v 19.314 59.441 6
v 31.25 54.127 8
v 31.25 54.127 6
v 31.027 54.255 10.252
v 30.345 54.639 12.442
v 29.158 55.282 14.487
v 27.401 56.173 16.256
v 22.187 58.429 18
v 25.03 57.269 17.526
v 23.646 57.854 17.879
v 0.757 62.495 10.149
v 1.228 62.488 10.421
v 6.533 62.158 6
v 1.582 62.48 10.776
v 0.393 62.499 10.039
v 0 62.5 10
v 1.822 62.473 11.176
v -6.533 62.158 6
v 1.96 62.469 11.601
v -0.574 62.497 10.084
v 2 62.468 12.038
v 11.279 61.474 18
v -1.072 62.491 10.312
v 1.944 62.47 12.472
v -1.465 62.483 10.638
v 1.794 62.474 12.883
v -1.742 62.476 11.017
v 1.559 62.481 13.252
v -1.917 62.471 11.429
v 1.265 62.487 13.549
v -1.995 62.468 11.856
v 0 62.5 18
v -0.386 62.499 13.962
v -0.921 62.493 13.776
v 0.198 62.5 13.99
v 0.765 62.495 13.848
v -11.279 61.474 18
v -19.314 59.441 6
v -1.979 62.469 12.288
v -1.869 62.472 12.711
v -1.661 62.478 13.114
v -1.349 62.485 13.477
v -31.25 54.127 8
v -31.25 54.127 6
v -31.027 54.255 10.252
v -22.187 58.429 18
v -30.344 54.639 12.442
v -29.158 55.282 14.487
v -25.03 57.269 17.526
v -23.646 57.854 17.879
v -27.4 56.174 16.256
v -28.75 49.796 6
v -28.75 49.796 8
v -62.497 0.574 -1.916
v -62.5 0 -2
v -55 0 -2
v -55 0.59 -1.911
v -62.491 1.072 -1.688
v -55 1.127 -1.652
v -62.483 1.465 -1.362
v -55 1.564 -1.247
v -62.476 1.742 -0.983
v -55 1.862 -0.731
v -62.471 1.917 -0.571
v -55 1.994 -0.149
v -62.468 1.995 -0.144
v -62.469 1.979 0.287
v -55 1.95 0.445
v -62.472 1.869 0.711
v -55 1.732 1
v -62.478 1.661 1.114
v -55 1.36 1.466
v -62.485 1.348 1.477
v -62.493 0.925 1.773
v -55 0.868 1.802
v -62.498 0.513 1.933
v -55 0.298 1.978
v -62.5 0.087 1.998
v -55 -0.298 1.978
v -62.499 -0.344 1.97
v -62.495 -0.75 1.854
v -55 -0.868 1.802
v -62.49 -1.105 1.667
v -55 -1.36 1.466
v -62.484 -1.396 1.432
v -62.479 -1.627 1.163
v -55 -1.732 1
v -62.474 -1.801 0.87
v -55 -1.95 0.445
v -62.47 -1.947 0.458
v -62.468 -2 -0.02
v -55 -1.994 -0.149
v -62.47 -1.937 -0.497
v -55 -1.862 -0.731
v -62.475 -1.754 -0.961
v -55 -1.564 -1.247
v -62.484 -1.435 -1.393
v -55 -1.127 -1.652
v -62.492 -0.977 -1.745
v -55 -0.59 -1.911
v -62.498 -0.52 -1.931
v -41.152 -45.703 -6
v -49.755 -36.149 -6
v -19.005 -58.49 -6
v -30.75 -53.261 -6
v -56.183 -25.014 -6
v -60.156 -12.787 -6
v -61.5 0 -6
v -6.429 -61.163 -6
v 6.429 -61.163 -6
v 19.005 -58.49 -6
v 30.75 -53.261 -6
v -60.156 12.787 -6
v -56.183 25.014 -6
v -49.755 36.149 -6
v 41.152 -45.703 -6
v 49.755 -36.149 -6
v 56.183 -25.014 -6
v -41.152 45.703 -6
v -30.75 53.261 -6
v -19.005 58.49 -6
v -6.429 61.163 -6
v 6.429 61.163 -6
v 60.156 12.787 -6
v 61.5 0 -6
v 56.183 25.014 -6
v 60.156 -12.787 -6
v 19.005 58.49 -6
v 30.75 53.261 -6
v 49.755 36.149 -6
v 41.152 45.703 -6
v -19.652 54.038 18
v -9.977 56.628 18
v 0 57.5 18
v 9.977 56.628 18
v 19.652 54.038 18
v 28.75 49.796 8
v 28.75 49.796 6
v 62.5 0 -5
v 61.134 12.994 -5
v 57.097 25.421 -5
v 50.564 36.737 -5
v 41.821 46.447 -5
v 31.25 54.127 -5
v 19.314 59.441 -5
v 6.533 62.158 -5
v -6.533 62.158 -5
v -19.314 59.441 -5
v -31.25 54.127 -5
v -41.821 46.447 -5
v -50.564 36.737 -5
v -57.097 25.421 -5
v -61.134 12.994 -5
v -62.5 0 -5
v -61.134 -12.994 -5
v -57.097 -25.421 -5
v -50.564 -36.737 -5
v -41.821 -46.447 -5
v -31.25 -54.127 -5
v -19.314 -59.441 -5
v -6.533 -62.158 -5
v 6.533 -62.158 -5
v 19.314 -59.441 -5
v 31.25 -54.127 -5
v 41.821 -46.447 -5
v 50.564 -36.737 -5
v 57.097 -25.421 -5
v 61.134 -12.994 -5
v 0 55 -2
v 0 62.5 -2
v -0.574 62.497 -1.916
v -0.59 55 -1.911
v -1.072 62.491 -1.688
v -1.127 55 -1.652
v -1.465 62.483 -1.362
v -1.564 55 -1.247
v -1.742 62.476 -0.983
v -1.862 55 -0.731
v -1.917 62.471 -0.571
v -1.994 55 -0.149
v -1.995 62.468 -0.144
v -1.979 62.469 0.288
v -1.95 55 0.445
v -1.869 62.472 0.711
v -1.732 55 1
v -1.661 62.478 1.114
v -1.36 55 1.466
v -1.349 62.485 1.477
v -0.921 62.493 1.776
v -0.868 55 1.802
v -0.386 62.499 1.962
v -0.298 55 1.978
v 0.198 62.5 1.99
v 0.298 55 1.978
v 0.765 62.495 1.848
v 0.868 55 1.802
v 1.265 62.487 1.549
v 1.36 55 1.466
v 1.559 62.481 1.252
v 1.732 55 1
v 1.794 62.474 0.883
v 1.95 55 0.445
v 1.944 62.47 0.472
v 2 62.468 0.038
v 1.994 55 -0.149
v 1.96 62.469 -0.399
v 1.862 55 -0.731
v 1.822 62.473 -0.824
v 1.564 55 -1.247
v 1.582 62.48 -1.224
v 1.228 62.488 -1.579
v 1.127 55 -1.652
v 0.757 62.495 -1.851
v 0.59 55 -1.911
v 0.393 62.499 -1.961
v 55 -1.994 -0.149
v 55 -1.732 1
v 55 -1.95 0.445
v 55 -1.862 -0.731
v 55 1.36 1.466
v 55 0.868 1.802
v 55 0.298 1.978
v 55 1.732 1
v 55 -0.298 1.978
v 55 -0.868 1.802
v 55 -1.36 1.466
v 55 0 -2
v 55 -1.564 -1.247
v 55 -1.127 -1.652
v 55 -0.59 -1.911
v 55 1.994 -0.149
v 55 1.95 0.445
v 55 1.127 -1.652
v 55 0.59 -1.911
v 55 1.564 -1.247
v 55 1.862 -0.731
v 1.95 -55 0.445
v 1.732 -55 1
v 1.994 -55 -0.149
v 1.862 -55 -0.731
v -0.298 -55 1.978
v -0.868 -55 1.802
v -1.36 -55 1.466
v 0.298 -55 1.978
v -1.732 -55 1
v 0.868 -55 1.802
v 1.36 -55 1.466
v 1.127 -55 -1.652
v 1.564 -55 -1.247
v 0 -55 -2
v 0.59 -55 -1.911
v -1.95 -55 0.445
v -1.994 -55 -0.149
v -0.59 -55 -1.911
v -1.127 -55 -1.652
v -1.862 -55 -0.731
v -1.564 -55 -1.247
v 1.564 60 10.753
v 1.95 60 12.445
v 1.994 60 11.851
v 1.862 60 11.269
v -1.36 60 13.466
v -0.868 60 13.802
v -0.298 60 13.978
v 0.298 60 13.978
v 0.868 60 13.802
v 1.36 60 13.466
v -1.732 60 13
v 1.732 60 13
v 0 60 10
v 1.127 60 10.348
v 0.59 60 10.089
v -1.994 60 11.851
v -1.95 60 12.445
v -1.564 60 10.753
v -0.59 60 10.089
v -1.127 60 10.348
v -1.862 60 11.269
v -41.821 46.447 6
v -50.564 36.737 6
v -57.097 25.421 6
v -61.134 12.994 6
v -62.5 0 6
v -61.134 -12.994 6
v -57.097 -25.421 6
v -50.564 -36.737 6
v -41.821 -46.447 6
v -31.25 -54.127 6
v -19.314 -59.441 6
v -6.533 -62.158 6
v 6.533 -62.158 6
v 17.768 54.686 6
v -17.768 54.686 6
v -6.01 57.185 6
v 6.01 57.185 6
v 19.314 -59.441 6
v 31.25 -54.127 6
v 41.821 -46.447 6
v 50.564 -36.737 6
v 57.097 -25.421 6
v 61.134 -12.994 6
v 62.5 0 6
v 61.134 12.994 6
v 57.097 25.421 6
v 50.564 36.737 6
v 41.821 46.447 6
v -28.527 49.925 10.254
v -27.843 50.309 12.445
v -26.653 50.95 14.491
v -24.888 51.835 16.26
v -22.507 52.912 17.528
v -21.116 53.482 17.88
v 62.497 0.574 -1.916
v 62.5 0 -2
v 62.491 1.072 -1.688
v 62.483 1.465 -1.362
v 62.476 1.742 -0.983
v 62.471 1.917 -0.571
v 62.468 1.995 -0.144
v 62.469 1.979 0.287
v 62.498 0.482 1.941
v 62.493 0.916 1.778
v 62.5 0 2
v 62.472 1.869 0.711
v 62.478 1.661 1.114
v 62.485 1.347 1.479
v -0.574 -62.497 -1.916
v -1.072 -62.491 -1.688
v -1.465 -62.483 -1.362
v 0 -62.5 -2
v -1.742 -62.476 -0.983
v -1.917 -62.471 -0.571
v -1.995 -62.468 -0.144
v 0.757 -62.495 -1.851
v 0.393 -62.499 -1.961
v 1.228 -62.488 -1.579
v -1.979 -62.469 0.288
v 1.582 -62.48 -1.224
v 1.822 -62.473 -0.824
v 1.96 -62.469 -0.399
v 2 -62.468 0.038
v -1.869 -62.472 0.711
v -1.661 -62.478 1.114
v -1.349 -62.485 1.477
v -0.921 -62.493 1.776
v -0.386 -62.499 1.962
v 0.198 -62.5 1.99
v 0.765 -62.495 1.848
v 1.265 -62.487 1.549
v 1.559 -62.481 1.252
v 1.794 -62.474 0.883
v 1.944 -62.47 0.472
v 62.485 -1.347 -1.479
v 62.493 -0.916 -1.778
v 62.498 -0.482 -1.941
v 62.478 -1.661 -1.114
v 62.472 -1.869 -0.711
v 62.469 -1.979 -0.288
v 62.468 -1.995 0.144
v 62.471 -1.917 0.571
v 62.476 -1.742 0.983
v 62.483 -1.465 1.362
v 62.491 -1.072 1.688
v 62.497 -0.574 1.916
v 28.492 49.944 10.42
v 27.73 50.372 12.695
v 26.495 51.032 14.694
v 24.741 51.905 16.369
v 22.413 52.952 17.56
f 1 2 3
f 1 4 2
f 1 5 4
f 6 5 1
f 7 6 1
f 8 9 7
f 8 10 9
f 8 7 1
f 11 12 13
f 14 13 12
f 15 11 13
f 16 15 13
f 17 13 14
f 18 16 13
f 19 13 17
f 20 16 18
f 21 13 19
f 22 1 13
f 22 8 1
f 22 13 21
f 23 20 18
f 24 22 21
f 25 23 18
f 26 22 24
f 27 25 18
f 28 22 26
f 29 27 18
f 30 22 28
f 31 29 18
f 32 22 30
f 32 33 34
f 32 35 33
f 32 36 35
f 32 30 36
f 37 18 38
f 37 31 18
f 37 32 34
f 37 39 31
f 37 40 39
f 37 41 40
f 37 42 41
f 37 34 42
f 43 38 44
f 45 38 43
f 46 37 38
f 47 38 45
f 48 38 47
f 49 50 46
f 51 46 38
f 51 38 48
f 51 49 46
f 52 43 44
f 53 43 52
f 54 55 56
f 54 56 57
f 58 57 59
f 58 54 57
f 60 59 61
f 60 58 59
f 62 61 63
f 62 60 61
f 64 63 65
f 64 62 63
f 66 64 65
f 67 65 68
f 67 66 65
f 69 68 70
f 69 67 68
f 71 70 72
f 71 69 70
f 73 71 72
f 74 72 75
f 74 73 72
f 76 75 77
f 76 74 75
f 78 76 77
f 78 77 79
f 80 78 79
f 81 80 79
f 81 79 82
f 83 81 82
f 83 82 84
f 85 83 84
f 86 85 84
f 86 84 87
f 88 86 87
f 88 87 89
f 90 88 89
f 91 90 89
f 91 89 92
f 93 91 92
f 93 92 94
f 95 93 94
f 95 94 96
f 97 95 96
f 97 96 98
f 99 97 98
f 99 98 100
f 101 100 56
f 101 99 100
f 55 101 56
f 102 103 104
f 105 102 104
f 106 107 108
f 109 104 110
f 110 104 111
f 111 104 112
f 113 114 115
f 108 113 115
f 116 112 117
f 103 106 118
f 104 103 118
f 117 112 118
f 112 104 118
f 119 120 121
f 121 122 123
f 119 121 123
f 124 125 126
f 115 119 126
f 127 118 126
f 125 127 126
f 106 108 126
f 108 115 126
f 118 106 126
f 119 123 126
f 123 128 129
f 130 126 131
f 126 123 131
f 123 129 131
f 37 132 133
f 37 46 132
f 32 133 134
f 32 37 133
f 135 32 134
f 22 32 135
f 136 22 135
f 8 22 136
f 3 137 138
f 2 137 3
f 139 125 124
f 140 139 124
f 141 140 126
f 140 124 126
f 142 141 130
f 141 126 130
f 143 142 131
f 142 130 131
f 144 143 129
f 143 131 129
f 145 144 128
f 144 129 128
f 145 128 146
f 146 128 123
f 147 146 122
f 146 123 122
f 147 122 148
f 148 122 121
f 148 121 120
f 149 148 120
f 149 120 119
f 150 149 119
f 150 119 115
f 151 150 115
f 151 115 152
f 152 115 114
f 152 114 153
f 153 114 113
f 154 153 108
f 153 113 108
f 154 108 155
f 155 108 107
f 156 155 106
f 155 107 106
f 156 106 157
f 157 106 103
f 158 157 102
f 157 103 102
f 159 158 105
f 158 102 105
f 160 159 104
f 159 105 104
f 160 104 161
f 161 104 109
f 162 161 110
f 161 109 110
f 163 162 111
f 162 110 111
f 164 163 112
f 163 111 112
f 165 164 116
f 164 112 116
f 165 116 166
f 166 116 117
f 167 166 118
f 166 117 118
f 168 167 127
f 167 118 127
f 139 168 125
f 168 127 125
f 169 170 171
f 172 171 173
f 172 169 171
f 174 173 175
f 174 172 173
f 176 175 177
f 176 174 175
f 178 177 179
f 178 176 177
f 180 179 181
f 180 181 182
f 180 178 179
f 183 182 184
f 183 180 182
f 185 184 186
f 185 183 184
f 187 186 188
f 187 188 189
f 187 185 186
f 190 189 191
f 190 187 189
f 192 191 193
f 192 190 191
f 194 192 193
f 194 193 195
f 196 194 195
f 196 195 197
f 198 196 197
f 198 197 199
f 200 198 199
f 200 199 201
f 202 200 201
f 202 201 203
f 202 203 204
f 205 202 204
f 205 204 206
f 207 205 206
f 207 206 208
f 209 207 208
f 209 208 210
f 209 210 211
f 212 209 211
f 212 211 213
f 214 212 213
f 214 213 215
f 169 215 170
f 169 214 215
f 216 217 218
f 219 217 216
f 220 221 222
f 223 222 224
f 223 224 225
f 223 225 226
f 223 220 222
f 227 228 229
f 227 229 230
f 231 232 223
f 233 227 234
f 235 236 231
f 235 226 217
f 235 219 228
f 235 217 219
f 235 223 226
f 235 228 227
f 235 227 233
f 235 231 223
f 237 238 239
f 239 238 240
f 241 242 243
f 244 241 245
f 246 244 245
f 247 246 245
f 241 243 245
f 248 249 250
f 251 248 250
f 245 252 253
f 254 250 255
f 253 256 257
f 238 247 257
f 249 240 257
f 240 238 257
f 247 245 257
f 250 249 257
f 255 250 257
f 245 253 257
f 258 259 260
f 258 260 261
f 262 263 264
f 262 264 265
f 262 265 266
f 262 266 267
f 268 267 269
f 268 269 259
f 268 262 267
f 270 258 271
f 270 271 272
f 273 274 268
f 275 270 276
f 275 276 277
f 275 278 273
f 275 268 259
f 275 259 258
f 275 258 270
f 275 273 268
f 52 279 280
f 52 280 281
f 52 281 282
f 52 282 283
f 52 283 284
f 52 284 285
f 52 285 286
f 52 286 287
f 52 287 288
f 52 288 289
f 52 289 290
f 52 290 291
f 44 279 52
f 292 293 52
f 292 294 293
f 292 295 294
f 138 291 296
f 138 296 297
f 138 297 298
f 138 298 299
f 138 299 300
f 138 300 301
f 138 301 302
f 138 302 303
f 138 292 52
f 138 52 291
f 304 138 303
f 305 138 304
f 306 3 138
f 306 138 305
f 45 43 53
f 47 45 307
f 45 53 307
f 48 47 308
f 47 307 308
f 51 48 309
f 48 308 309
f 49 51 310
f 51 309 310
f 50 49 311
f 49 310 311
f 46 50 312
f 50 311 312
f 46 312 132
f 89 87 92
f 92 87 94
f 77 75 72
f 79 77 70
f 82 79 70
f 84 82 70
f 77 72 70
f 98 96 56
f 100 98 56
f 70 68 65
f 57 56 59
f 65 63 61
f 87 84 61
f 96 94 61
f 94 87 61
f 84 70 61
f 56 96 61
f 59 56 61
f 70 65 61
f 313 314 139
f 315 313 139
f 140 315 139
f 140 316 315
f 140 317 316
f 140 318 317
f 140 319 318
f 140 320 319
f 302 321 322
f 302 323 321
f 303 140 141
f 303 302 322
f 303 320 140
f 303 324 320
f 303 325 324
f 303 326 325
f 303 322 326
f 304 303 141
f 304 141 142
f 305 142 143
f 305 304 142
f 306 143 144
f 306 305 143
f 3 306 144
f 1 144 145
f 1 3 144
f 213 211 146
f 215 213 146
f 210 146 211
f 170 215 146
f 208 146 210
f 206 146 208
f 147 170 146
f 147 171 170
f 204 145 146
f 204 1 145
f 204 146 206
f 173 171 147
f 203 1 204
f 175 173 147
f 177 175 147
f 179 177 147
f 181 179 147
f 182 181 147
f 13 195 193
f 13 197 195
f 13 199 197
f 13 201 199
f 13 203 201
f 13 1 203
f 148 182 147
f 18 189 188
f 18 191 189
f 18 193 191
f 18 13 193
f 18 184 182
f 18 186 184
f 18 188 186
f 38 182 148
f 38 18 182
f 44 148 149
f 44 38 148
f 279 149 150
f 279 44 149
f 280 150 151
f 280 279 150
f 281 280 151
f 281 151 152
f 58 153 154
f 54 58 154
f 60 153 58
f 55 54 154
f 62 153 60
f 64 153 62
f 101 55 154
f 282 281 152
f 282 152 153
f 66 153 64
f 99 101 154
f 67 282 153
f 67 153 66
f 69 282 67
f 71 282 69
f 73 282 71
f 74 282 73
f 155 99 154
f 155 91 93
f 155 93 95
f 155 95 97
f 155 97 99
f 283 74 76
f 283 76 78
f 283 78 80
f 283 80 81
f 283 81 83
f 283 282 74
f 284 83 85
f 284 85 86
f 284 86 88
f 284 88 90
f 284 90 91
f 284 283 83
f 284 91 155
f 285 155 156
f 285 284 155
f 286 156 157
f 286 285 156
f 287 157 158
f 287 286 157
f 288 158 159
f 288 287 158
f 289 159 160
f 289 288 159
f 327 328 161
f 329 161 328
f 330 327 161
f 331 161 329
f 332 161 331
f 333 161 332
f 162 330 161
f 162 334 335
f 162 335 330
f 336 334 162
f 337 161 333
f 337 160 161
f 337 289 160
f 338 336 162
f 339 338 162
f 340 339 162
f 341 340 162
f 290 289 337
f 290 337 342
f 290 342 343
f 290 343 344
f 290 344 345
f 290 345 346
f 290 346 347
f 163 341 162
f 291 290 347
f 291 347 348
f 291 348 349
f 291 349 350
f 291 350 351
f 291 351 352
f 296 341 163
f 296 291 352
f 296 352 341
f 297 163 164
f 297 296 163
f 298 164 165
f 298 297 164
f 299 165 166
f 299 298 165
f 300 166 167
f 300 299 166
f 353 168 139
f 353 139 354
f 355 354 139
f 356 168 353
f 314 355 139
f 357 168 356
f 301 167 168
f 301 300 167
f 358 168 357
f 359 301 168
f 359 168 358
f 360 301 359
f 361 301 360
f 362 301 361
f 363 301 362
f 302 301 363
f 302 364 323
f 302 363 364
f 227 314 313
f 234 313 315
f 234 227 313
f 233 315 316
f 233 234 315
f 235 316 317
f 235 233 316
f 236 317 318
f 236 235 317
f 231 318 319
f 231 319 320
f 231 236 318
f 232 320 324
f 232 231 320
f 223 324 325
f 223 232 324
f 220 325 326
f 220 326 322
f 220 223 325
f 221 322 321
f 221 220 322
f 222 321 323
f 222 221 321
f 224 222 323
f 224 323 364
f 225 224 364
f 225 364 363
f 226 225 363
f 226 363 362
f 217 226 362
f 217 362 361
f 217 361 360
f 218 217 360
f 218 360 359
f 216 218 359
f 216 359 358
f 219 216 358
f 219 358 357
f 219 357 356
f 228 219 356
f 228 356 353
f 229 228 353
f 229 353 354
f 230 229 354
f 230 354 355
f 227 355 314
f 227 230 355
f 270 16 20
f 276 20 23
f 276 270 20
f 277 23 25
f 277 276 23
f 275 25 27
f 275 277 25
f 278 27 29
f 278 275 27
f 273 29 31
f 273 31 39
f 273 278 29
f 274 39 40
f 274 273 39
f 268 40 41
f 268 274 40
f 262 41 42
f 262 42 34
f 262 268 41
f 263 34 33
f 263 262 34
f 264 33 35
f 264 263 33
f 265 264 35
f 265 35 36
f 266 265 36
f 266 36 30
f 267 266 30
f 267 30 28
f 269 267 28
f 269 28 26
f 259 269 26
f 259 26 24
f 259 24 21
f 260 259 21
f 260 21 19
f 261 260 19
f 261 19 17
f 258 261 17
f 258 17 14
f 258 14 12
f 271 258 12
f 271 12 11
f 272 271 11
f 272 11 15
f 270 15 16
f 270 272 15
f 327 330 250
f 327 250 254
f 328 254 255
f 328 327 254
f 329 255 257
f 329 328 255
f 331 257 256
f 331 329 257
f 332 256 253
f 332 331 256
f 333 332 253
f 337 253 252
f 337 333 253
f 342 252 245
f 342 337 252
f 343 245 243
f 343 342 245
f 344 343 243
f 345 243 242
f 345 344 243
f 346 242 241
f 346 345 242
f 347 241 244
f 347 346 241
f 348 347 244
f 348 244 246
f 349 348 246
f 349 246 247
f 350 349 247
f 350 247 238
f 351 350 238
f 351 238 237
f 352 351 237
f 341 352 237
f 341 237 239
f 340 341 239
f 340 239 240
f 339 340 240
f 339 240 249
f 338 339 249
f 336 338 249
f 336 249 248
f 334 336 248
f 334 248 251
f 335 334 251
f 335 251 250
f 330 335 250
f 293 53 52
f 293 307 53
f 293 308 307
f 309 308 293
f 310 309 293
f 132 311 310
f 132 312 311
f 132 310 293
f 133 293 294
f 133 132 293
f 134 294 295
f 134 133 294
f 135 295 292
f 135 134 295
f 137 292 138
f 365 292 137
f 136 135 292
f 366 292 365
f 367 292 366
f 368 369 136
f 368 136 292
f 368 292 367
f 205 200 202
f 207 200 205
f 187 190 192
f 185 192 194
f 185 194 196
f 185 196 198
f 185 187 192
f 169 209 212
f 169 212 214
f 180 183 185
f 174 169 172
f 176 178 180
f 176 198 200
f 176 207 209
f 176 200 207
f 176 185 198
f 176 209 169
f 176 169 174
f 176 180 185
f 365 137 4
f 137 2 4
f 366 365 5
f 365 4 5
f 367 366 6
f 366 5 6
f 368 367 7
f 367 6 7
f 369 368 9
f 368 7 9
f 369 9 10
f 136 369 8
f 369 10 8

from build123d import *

# Parameters (mm, degrees)
SKETCH1_R           = 62.5
BOSS_EXTRUDE1_DEPTH = 6
CUT_EXTRUDE1_START  = 55
SKETCH2_R           = 2
CUT_EXTRUDE1_DEPTH  = 13
CUT_EXTRUDE2_START  = -68
SKETCH2_2_R         = 2
CUT_EXTRUDE2_DEPTH  = 13
CUT_EXTRUDE3_START  = 55
SKETCH3_R           = 2
CUT_EXTRUDE3_DEPTH  = 13
CUT_EXTRUDE4_START  = -68
SKETCH3_2_R         = 2
CUT_EXTRUDE4_DEPTH  = 13
BOSS_EXTRUDE2_START = 12
BOSS_EXTRUDE2_DEPTH = 12
FILLET1_R           = 10
CUT_EXTRUDE8_START  = 60
SKETCH6_R           = 2
CUT_EXTRUDE8_DEPTH  = 12.5
CHAMFER1_SIZE       = 1


with BuildPart() as part:
    # Sketch1 → Boss-Extrude1 (new, symmetric)
    with BuildSketch(Plane.XY):
        Circle(SKETCH1_R)
    extrude(amount=BOSS_EXTRUDE1_DEPTH, both=True)

    # Sketch2 → Cut-Extrude1 (cut)
    with BuildSketch(Plane(origin=(0, 0, 0), x_dir=(1, 0, 0), z_dir=(0, 1, 0)).offset(CUT_EXTRUDE1_START)):
        Circle(SKETCH2_R)
    extrude(amount=CUT_EXTRUDE1_DEPTH, mode=Mode.SUBTRACT)

    # Sketch2<2> → Cut-Extrude2 (cut)
    with BuildSketch(Plane(origin=(0, 0, 0), x_dir=(1, 0, 0), z_dir=(0, 1, 0)).offset(CUT_EXTRUDE2_START)):
        Circle(SKETCH2_2_R)
    extrude(amount=CUT_EXTRUDE2_DEPTH, mode=Mode.SUBTRACT)

    # Sketch3 → Cut-Extrude3 (cut)
    with BuildSketch(Plane(origin=(0, 0, 0), x_dir=(0, 0, -1), z_dir=(1, 0, 0)).offset(CUT_EXTRUDE3_START)):
        Circle(SKETCH3_R)
    extrude(amount=CUT_EXTRUDE3_DEPTH, mode=Mode.SUBTRACT)

    # Sketch3<2> → Cut-Extrude4 (cut)
    with BuildSketch(Plane(origin=(0, 0, 0), x_dir=(0, 0, -1), z_dir=(1, 0, 0)).offset(CUT_EXTRUDE4_START)):
        Circle(SKETCH3_2_R)
    extrude(amount=CUT_EXTRUDE4_DEPTH, mode=Mode.SUBTRACT)

    # Sketch5 → Boss-Extrude2 (add)
    with BuildSketch(Plane.XY.offset(6).offset(BOSS_EXTRUDE2_START)):
        with BuildLine():
            Line((-31.25, 54.126587737), (-28.75, 49.796460718))
            ThreePointArc((-28.75, 49.796460718), (0, 57.5), (28.75, 49.796460718))
            Line((28.75, 49.796460718), (31.25, 54.126587737))
            ThreePointArc((31.25, 54.126587737), (0, 62.5), (-31.25, 54.126587737))
        make_face()
    extrude(amount=-BOSS_EXTRUDE2_DEPTH)

    # Fillet1
    fillet1_edges = [part.edges().sort_by_distance(p)[0] for p in [
        (-30, 51.961524227, 18),
        (30, 51.961524227, 18),
    ]]
    fillet(fillet1_edges, radius=FILLET1_R)

    # Sketch6 → Cut-Extrude8 (cut)
    with BuildSketch(Plane(origin=(0, 0, 0), x_dir=(1, 0, 0), z_dir=(0, 1, 0)).offset(CUT_EXTRUDE8_START)):
        with Locations((0, -12)):
            Circle(SKETCH6_R)
    extrude(amount=CUT_EXTRUDE8_DEPTH, mode=Mode.SUBTRACT)

    # Chamfer1
    chamfer1_edges = [part.edges().sort_by_distance(p)[0] for p in [
        (-62.5, 0, -6),
    ]]
    chamfer(chamfer1_edges, length=CHAMFER1_SIZE)


solid = part.part
